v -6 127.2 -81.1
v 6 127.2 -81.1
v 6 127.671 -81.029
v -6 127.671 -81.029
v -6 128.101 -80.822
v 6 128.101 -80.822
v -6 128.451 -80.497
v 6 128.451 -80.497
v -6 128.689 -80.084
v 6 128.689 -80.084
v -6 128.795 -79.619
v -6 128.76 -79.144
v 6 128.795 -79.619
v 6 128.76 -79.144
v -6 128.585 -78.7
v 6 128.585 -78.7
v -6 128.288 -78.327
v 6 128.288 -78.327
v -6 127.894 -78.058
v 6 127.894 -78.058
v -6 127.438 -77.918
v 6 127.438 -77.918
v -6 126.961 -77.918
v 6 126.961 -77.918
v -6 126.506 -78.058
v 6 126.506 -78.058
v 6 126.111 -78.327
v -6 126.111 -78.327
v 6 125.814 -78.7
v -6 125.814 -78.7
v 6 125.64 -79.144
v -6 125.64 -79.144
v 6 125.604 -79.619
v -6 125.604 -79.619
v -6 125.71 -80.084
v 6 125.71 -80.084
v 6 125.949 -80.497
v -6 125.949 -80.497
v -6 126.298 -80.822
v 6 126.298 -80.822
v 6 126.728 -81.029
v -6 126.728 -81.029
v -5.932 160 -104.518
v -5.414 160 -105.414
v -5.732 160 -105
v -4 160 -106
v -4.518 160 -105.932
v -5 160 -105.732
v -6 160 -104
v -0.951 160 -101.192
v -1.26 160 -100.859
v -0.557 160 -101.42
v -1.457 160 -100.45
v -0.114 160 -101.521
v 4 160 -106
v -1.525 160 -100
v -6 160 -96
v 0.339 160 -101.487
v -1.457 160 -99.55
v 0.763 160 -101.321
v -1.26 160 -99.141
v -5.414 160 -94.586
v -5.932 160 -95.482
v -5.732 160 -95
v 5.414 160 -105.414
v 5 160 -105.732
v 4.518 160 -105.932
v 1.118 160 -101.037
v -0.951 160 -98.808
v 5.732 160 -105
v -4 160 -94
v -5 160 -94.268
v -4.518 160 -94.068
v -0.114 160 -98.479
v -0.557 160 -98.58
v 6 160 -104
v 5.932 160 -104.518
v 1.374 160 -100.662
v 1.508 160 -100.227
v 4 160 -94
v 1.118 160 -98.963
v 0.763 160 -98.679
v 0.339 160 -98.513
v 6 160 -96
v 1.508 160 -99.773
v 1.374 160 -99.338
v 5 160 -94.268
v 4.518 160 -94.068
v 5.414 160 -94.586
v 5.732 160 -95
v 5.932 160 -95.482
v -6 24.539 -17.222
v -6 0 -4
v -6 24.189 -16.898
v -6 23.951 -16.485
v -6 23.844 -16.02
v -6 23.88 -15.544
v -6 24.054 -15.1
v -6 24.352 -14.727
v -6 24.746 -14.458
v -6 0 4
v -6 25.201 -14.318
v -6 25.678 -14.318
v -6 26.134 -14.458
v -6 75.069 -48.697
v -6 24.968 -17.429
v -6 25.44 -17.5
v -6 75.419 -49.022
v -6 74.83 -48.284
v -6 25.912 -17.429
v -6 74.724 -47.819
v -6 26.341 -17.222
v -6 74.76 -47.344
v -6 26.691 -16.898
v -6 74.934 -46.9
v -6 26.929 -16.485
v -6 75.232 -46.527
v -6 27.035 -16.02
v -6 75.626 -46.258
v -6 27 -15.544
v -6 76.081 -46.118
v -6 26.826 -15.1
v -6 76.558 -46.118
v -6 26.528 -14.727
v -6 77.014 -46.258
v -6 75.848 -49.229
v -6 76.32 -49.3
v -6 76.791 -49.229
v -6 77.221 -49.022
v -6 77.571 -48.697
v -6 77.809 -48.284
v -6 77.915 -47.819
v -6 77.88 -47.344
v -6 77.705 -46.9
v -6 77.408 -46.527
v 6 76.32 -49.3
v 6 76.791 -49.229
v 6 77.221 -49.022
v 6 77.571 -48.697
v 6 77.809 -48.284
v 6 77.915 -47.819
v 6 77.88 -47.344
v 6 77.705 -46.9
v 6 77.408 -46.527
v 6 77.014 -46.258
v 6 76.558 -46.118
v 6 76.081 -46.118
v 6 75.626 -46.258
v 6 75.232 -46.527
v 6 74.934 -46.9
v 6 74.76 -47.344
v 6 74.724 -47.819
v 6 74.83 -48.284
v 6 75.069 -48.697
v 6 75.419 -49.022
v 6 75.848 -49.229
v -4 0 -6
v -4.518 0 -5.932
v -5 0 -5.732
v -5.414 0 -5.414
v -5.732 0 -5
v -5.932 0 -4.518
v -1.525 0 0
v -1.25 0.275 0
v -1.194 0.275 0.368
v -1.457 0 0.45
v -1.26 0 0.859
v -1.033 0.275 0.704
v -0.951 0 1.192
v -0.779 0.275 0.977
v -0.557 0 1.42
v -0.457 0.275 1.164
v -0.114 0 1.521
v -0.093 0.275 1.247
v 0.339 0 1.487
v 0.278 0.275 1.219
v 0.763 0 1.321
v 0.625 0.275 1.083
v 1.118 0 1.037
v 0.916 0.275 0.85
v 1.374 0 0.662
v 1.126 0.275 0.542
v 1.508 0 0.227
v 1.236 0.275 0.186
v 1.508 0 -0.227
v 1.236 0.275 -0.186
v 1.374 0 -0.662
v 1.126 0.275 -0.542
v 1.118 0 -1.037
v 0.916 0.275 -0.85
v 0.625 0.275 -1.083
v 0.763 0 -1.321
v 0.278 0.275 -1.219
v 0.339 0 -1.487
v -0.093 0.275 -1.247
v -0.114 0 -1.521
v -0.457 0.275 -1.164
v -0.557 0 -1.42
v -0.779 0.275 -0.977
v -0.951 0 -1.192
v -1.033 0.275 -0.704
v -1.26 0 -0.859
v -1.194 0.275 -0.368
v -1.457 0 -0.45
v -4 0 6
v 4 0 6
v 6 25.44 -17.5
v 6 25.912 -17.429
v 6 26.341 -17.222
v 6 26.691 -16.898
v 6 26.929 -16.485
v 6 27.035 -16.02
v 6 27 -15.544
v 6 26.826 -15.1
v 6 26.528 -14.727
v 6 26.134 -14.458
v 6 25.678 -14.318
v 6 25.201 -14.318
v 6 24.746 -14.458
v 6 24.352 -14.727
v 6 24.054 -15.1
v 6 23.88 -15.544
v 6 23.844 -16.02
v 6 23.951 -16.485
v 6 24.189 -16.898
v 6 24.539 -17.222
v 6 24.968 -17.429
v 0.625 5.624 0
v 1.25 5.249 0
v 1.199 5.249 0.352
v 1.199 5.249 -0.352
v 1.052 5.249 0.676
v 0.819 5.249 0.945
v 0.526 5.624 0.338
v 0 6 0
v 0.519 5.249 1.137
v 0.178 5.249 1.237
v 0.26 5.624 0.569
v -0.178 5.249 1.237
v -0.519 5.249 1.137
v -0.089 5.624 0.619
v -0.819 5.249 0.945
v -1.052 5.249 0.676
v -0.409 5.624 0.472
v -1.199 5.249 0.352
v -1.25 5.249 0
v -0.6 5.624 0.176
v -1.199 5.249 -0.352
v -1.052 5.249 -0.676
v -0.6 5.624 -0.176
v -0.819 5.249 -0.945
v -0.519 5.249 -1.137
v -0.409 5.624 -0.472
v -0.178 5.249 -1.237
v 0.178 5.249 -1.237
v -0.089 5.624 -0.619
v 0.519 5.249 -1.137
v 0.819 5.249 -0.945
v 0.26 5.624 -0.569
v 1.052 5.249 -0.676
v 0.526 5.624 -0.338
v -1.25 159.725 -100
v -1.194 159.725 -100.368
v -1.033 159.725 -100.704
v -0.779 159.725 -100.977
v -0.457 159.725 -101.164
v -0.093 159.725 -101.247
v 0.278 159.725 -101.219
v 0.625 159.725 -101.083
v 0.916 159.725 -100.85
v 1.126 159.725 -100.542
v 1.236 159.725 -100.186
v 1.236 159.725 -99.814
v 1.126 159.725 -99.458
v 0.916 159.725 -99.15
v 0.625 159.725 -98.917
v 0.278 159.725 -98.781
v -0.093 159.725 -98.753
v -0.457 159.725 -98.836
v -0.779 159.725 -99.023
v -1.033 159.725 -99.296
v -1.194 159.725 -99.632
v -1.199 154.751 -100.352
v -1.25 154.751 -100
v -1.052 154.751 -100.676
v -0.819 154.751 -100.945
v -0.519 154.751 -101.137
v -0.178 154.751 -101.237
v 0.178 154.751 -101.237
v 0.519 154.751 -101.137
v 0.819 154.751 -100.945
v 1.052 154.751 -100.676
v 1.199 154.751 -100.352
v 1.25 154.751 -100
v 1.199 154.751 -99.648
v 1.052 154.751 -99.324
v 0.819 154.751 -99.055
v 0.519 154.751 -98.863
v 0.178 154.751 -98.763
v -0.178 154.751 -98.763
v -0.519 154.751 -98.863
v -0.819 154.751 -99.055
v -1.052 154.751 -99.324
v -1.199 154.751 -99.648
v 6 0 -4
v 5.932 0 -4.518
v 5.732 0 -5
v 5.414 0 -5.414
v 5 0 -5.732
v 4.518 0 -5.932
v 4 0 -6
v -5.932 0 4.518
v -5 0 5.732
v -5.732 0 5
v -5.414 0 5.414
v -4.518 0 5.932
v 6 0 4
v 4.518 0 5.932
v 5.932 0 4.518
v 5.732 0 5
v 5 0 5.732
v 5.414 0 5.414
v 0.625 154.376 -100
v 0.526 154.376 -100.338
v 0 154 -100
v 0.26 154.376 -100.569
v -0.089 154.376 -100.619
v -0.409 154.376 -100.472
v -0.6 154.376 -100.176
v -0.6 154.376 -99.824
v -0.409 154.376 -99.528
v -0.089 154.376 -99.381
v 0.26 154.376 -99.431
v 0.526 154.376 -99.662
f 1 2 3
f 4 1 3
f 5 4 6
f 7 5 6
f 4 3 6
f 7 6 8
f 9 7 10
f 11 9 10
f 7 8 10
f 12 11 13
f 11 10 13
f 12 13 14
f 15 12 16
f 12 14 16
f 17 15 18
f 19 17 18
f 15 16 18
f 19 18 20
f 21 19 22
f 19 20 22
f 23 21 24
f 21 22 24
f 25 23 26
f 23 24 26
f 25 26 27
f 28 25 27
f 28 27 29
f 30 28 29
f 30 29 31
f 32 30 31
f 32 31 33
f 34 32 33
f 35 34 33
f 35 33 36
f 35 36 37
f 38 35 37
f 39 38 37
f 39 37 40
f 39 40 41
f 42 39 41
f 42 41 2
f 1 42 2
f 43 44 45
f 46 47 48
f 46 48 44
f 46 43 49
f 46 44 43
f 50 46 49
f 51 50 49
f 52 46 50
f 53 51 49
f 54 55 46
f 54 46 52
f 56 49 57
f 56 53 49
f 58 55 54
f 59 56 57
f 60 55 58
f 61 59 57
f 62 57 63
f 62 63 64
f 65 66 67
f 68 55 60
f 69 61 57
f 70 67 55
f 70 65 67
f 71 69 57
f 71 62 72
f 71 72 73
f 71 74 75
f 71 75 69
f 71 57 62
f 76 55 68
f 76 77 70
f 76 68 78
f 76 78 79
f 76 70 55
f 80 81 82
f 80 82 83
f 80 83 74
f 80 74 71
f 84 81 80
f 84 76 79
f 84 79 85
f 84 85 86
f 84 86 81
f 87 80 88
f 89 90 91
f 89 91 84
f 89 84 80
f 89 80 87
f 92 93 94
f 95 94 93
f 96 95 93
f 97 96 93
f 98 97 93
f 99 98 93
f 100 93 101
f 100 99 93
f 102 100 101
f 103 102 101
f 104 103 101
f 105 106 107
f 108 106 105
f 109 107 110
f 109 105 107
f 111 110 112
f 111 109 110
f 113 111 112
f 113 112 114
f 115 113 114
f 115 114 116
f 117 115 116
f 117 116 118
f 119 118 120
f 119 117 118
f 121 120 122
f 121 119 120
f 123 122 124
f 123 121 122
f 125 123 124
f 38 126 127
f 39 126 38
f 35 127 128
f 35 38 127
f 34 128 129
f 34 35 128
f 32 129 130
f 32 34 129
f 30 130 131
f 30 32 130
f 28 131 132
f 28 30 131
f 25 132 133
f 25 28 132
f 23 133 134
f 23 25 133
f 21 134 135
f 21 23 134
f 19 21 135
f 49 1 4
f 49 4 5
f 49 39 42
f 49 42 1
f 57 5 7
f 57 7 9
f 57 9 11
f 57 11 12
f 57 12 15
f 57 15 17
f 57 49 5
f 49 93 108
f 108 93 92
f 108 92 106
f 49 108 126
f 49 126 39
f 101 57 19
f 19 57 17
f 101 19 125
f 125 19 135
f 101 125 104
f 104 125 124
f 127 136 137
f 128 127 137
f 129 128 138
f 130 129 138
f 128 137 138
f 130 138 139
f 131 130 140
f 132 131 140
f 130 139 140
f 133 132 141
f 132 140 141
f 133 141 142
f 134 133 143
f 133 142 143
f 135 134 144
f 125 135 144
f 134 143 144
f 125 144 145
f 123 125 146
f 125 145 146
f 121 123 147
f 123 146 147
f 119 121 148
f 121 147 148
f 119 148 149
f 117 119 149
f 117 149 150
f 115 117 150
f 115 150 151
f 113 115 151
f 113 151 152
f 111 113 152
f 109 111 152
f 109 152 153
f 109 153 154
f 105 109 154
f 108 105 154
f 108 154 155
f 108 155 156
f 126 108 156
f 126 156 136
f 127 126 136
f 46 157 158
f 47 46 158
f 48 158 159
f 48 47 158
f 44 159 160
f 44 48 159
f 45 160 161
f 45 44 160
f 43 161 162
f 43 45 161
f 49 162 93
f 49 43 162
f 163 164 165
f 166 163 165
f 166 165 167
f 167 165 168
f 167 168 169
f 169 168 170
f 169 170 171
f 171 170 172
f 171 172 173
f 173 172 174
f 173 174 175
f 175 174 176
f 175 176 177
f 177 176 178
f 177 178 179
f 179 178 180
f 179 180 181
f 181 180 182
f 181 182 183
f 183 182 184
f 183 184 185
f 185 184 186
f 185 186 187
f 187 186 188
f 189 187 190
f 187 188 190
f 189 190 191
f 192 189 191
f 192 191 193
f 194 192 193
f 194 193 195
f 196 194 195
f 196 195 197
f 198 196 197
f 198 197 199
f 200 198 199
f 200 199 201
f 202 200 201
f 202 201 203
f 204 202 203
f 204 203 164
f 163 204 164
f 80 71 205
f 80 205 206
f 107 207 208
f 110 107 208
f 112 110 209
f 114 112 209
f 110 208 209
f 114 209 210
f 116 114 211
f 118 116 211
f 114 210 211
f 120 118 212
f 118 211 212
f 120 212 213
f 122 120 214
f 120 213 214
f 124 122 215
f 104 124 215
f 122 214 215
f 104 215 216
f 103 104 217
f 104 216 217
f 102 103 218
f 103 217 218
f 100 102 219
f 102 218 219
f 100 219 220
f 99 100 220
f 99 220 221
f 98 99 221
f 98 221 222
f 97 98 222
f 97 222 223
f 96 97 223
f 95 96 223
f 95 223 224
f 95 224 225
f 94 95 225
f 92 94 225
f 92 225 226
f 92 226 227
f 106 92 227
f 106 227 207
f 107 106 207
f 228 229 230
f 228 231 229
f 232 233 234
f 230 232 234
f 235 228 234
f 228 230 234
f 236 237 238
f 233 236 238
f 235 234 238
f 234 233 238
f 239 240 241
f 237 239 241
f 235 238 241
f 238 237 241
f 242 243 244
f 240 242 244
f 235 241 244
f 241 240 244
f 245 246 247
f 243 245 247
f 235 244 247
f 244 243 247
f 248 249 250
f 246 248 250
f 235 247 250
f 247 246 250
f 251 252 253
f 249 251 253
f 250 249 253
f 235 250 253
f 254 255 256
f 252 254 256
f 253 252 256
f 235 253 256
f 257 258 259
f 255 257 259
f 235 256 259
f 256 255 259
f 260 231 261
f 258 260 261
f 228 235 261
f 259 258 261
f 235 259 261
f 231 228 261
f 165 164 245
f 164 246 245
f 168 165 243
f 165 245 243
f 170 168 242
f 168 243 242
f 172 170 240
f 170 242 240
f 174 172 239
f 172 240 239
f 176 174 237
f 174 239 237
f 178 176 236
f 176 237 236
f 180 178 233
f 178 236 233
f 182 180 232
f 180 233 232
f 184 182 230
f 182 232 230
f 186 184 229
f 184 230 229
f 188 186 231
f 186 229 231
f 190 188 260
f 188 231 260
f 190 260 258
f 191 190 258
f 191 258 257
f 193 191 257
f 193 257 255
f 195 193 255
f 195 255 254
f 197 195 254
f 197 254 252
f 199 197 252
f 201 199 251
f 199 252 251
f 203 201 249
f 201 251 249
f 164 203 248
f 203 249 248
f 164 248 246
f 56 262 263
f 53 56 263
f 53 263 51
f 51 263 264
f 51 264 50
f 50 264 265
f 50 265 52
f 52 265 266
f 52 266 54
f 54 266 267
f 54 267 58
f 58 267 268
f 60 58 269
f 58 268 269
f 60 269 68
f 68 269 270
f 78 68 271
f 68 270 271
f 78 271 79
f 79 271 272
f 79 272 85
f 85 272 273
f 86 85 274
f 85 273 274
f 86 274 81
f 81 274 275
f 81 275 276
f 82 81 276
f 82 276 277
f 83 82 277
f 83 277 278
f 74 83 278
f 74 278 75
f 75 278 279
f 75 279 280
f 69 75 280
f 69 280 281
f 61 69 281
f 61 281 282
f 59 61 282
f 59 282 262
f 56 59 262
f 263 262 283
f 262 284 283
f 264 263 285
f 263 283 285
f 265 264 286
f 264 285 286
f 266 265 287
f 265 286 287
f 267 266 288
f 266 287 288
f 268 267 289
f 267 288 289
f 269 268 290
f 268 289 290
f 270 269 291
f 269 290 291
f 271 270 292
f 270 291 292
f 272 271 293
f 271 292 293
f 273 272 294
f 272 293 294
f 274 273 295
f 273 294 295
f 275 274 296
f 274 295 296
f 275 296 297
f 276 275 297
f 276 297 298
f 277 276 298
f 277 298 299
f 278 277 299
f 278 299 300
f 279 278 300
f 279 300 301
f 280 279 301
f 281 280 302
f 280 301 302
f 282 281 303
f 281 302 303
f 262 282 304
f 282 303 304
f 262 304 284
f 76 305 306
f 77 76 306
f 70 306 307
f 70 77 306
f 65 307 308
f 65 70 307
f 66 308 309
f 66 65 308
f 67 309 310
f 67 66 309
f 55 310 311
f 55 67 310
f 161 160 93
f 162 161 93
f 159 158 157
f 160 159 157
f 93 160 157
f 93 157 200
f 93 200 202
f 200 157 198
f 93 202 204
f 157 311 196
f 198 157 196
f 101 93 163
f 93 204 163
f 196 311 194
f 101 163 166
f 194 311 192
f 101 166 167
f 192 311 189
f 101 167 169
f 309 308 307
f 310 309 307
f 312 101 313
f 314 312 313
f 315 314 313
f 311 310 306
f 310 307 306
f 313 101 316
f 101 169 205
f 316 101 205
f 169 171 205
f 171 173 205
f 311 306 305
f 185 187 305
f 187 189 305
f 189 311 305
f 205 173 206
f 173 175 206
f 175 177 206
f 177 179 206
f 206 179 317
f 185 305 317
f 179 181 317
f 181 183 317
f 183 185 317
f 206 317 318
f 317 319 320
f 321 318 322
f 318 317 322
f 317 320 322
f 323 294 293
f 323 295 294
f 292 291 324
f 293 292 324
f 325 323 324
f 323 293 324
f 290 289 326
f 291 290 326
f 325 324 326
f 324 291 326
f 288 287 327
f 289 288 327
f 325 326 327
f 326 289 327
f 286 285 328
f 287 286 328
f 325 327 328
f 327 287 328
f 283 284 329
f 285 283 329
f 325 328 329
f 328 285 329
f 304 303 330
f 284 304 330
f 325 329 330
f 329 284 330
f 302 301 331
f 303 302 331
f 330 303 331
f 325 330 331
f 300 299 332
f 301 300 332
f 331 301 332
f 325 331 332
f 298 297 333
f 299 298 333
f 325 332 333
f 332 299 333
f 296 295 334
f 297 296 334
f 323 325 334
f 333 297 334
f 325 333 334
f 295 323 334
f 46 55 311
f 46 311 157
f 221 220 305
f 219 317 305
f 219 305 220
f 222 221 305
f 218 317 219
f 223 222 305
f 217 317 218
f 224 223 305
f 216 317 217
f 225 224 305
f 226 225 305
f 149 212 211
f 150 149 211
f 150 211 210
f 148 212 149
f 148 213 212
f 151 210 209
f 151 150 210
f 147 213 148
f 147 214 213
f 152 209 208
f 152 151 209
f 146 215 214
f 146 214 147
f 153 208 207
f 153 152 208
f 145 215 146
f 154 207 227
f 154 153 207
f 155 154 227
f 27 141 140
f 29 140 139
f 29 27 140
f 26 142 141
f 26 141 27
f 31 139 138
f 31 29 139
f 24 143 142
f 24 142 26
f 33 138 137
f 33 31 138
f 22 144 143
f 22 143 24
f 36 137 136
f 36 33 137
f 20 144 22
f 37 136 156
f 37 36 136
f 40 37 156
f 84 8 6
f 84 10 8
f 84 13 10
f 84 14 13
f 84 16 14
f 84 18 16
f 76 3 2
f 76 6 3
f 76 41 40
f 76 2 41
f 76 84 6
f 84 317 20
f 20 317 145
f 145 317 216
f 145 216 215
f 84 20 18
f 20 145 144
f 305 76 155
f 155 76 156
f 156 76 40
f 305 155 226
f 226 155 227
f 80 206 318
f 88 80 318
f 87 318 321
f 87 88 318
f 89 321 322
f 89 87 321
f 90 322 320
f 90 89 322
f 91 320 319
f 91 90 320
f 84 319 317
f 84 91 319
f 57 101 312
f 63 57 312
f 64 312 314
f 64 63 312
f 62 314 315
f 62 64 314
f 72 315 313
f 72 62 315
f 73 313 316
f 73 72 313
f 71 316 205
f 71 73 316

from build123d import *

# Parameters (mm, degrees)
HOLE_WIZARD_M3_1_D           = 2.5
HOLE_WIZARD_M3_1_DEPTH       = 5.248924226
HOLE_WIZARD_M3_1_CSINK_D     = 3.05
HOLE_WIZARD_M3_1_CSINK_ANGLE = 90
HOLE_WIZARD_M3_1_TIP         = 0.751075774
HOLE_WIZARD_M3_2_D           = 2.5
HOLE_WIZARD_M3_2_DEPTH       = 5.248924226
HOLE_WIZARD_M3_2_CSINK_D     = 3.05
HOLE_WIZARD_M3_2_CSINK_ANGLE = 90
HOLE_WIZARD_M3_2_TIP         = 0.751075774
CUT_EXTRUDE_1_REACH          = 194.302
SKETCH_7_R                   = 1.6


with BuildPart() as part:
    # 扫描2: sweep along a path in 草图2
    with BuildLine(Plane(origin=(0, 0, 0), x_dir=(0, 0, -1), z_dir=(1, 0, 0))) as sweep_2_path:
        Line((0, 0), (100, 160))
    # 草图1 → 扫描2 (sweep)
    with BuildSketch(Plane(origin=(0, 0, 0), x_dir=(1, 0, 0), z_dir=(0, 1, 0))):
        with BuildLine():
            Line((-4, 6), (4, 6))
            ThreePointArc((4, 6), (5.414213562, 5.414213562), (6, 4))
            Line((6, 4), (6, -4))
            ThreePointArc((6, -4), (5.414213562, -5.414213562), (4, -6))
            Line((4, -6), (-4, -6))
            ThreePointArc((-4, -6), (-5.414213562, -5.414213562), (-6, -4))
            Line((-6, -4), (-6, 4))
            ThreePointArc((-6, 4), (-5.414213562, 5.414213562), (-4, 6))
        make_face()
    sweep(path=sweep_2_path.line)

    # M3 螺纹孔1
    with Locations(Plane.XZ):
        with Locations((0, 0)):
            CounterSinkHole(HOLE_WIZARD_M3_1_D / 2, HOLE_WIZARD_M3_1_CSINK_D / 2, depth=HOLE_WIZARD_M3_1_DEPTH, counter_sink_angle=HOLE_WIZARD_M3_1_CSINK_ANGLE)
            with Locations((0, 0, -(HOLE_WIZARD_M3_1_DEPTH + HOLE_WIZARD_M3_1_TIP / 2))):  # 118° drill point
                Cone(0, HOLE_WIZARD_M3_1_D / 2, HOLE_WIZARD_M3_1_TIP, mode=Mode.SUBTRACT)

    # M3 螺纹孔2
    with Locations(Plane(origin=(0, 160, 0), x_dir=(1, 0, 0), z_dir=(0, 1, 0))):
        with Locations((0, 100)):
            CounterSinkHole(HOLE_WIZARD_M3_2_D / 2, HOLE_WIZARD_M3_2_CSINK_D / 2, depth=HOLE_WIZARD_M3_2_DEPTH, counter_sink_angle=HOLE_WIZARD_M3_2_CSINK_ANGLE)
            with Locations((0, 0, -(HOLE_WIZARD_M3_2_DEPTH + HOLE_WIZARD_M3_2_TIP / 2))):  # 118° drill point
                Cone(0, HOLE_WIZARD_M3_2_D / 2, HOLE_WIZARD_M3_2_TIP, mode=Mode.SUBTRACT)

    # 草图7 → 切除-拉伸1 (cut, up to next)
    with BuildSketch(Plane(origin=(6, 0, 0), x_dir=(0, 0, -1), z_dir=(1, 0, 0)), mode=Mode.PRIVATE) as cut_extrude_1_sk1:
        with Locations((15.8999682, 25.43994912)):
            Circle(SKETCH_7_R)
    cut_extrude_1_tool1 = extrude(cut_extrude_1_sk1.sketch, amount=-CUT_EXTRUDE_1_REACH, mode=Mode.PRIVATE) & part.part
    # 草图7 → 切除-拉伸1 (cut, up to next)
    with BuildSketch(Plane(origin=(6, 0, 0), x_dir=(0, 0, -1), z_dir=(1, 0, 0)), mode=Mode.PRIVATE) as cut_extrude_1_sk2:
        with Locations((47.6999046, 76.31984736)):
            Circle(SKETCH_7_R)
    cut_extrude_1_tool2 = extrude(cut_extrude_1_sk2.sketch, amount=-CUT_EXTRUDE_1_REACH, mode=Mode.PRIVATE) & part.part
    # 草图7 → 切除-拉伸1 (cut, up to next)
    with BuildSketch(Plane(origin=(6, 0, 0), x_dir=(0, 0, -1), z_dir=(1, 0, 0)), mode=Mode.PRIVATE) as cut_extrude_1_sk3:
        with Locations((79.499841, 127.199745601)):
            Circle(SKETCH_7_R)
    cut_extrude_1_tool3 = extrude(cut_extrude_1_sk3.sketch, amount=-CUT_EXTRUDE_1_REACH, mode=Mode.PRIVATE) & part.part
    add(cut_extrude_1_tool1.solids().sort_by_distance((6, 25.439949, -15.899968))[0], mode=Mode.SUBTRACT)
    add(cut_extrude_1_tool2.solids().sort_by_distance((6, 76.319847, -47.699905))[0], mode=Mode.SUBTRACT)
    add(cut_extrude_1_tool3.solids().sort_by_distance((6, 127.199746, -79.499841))[0], mode=Mode.SUBTRACT)


solid = part.part
